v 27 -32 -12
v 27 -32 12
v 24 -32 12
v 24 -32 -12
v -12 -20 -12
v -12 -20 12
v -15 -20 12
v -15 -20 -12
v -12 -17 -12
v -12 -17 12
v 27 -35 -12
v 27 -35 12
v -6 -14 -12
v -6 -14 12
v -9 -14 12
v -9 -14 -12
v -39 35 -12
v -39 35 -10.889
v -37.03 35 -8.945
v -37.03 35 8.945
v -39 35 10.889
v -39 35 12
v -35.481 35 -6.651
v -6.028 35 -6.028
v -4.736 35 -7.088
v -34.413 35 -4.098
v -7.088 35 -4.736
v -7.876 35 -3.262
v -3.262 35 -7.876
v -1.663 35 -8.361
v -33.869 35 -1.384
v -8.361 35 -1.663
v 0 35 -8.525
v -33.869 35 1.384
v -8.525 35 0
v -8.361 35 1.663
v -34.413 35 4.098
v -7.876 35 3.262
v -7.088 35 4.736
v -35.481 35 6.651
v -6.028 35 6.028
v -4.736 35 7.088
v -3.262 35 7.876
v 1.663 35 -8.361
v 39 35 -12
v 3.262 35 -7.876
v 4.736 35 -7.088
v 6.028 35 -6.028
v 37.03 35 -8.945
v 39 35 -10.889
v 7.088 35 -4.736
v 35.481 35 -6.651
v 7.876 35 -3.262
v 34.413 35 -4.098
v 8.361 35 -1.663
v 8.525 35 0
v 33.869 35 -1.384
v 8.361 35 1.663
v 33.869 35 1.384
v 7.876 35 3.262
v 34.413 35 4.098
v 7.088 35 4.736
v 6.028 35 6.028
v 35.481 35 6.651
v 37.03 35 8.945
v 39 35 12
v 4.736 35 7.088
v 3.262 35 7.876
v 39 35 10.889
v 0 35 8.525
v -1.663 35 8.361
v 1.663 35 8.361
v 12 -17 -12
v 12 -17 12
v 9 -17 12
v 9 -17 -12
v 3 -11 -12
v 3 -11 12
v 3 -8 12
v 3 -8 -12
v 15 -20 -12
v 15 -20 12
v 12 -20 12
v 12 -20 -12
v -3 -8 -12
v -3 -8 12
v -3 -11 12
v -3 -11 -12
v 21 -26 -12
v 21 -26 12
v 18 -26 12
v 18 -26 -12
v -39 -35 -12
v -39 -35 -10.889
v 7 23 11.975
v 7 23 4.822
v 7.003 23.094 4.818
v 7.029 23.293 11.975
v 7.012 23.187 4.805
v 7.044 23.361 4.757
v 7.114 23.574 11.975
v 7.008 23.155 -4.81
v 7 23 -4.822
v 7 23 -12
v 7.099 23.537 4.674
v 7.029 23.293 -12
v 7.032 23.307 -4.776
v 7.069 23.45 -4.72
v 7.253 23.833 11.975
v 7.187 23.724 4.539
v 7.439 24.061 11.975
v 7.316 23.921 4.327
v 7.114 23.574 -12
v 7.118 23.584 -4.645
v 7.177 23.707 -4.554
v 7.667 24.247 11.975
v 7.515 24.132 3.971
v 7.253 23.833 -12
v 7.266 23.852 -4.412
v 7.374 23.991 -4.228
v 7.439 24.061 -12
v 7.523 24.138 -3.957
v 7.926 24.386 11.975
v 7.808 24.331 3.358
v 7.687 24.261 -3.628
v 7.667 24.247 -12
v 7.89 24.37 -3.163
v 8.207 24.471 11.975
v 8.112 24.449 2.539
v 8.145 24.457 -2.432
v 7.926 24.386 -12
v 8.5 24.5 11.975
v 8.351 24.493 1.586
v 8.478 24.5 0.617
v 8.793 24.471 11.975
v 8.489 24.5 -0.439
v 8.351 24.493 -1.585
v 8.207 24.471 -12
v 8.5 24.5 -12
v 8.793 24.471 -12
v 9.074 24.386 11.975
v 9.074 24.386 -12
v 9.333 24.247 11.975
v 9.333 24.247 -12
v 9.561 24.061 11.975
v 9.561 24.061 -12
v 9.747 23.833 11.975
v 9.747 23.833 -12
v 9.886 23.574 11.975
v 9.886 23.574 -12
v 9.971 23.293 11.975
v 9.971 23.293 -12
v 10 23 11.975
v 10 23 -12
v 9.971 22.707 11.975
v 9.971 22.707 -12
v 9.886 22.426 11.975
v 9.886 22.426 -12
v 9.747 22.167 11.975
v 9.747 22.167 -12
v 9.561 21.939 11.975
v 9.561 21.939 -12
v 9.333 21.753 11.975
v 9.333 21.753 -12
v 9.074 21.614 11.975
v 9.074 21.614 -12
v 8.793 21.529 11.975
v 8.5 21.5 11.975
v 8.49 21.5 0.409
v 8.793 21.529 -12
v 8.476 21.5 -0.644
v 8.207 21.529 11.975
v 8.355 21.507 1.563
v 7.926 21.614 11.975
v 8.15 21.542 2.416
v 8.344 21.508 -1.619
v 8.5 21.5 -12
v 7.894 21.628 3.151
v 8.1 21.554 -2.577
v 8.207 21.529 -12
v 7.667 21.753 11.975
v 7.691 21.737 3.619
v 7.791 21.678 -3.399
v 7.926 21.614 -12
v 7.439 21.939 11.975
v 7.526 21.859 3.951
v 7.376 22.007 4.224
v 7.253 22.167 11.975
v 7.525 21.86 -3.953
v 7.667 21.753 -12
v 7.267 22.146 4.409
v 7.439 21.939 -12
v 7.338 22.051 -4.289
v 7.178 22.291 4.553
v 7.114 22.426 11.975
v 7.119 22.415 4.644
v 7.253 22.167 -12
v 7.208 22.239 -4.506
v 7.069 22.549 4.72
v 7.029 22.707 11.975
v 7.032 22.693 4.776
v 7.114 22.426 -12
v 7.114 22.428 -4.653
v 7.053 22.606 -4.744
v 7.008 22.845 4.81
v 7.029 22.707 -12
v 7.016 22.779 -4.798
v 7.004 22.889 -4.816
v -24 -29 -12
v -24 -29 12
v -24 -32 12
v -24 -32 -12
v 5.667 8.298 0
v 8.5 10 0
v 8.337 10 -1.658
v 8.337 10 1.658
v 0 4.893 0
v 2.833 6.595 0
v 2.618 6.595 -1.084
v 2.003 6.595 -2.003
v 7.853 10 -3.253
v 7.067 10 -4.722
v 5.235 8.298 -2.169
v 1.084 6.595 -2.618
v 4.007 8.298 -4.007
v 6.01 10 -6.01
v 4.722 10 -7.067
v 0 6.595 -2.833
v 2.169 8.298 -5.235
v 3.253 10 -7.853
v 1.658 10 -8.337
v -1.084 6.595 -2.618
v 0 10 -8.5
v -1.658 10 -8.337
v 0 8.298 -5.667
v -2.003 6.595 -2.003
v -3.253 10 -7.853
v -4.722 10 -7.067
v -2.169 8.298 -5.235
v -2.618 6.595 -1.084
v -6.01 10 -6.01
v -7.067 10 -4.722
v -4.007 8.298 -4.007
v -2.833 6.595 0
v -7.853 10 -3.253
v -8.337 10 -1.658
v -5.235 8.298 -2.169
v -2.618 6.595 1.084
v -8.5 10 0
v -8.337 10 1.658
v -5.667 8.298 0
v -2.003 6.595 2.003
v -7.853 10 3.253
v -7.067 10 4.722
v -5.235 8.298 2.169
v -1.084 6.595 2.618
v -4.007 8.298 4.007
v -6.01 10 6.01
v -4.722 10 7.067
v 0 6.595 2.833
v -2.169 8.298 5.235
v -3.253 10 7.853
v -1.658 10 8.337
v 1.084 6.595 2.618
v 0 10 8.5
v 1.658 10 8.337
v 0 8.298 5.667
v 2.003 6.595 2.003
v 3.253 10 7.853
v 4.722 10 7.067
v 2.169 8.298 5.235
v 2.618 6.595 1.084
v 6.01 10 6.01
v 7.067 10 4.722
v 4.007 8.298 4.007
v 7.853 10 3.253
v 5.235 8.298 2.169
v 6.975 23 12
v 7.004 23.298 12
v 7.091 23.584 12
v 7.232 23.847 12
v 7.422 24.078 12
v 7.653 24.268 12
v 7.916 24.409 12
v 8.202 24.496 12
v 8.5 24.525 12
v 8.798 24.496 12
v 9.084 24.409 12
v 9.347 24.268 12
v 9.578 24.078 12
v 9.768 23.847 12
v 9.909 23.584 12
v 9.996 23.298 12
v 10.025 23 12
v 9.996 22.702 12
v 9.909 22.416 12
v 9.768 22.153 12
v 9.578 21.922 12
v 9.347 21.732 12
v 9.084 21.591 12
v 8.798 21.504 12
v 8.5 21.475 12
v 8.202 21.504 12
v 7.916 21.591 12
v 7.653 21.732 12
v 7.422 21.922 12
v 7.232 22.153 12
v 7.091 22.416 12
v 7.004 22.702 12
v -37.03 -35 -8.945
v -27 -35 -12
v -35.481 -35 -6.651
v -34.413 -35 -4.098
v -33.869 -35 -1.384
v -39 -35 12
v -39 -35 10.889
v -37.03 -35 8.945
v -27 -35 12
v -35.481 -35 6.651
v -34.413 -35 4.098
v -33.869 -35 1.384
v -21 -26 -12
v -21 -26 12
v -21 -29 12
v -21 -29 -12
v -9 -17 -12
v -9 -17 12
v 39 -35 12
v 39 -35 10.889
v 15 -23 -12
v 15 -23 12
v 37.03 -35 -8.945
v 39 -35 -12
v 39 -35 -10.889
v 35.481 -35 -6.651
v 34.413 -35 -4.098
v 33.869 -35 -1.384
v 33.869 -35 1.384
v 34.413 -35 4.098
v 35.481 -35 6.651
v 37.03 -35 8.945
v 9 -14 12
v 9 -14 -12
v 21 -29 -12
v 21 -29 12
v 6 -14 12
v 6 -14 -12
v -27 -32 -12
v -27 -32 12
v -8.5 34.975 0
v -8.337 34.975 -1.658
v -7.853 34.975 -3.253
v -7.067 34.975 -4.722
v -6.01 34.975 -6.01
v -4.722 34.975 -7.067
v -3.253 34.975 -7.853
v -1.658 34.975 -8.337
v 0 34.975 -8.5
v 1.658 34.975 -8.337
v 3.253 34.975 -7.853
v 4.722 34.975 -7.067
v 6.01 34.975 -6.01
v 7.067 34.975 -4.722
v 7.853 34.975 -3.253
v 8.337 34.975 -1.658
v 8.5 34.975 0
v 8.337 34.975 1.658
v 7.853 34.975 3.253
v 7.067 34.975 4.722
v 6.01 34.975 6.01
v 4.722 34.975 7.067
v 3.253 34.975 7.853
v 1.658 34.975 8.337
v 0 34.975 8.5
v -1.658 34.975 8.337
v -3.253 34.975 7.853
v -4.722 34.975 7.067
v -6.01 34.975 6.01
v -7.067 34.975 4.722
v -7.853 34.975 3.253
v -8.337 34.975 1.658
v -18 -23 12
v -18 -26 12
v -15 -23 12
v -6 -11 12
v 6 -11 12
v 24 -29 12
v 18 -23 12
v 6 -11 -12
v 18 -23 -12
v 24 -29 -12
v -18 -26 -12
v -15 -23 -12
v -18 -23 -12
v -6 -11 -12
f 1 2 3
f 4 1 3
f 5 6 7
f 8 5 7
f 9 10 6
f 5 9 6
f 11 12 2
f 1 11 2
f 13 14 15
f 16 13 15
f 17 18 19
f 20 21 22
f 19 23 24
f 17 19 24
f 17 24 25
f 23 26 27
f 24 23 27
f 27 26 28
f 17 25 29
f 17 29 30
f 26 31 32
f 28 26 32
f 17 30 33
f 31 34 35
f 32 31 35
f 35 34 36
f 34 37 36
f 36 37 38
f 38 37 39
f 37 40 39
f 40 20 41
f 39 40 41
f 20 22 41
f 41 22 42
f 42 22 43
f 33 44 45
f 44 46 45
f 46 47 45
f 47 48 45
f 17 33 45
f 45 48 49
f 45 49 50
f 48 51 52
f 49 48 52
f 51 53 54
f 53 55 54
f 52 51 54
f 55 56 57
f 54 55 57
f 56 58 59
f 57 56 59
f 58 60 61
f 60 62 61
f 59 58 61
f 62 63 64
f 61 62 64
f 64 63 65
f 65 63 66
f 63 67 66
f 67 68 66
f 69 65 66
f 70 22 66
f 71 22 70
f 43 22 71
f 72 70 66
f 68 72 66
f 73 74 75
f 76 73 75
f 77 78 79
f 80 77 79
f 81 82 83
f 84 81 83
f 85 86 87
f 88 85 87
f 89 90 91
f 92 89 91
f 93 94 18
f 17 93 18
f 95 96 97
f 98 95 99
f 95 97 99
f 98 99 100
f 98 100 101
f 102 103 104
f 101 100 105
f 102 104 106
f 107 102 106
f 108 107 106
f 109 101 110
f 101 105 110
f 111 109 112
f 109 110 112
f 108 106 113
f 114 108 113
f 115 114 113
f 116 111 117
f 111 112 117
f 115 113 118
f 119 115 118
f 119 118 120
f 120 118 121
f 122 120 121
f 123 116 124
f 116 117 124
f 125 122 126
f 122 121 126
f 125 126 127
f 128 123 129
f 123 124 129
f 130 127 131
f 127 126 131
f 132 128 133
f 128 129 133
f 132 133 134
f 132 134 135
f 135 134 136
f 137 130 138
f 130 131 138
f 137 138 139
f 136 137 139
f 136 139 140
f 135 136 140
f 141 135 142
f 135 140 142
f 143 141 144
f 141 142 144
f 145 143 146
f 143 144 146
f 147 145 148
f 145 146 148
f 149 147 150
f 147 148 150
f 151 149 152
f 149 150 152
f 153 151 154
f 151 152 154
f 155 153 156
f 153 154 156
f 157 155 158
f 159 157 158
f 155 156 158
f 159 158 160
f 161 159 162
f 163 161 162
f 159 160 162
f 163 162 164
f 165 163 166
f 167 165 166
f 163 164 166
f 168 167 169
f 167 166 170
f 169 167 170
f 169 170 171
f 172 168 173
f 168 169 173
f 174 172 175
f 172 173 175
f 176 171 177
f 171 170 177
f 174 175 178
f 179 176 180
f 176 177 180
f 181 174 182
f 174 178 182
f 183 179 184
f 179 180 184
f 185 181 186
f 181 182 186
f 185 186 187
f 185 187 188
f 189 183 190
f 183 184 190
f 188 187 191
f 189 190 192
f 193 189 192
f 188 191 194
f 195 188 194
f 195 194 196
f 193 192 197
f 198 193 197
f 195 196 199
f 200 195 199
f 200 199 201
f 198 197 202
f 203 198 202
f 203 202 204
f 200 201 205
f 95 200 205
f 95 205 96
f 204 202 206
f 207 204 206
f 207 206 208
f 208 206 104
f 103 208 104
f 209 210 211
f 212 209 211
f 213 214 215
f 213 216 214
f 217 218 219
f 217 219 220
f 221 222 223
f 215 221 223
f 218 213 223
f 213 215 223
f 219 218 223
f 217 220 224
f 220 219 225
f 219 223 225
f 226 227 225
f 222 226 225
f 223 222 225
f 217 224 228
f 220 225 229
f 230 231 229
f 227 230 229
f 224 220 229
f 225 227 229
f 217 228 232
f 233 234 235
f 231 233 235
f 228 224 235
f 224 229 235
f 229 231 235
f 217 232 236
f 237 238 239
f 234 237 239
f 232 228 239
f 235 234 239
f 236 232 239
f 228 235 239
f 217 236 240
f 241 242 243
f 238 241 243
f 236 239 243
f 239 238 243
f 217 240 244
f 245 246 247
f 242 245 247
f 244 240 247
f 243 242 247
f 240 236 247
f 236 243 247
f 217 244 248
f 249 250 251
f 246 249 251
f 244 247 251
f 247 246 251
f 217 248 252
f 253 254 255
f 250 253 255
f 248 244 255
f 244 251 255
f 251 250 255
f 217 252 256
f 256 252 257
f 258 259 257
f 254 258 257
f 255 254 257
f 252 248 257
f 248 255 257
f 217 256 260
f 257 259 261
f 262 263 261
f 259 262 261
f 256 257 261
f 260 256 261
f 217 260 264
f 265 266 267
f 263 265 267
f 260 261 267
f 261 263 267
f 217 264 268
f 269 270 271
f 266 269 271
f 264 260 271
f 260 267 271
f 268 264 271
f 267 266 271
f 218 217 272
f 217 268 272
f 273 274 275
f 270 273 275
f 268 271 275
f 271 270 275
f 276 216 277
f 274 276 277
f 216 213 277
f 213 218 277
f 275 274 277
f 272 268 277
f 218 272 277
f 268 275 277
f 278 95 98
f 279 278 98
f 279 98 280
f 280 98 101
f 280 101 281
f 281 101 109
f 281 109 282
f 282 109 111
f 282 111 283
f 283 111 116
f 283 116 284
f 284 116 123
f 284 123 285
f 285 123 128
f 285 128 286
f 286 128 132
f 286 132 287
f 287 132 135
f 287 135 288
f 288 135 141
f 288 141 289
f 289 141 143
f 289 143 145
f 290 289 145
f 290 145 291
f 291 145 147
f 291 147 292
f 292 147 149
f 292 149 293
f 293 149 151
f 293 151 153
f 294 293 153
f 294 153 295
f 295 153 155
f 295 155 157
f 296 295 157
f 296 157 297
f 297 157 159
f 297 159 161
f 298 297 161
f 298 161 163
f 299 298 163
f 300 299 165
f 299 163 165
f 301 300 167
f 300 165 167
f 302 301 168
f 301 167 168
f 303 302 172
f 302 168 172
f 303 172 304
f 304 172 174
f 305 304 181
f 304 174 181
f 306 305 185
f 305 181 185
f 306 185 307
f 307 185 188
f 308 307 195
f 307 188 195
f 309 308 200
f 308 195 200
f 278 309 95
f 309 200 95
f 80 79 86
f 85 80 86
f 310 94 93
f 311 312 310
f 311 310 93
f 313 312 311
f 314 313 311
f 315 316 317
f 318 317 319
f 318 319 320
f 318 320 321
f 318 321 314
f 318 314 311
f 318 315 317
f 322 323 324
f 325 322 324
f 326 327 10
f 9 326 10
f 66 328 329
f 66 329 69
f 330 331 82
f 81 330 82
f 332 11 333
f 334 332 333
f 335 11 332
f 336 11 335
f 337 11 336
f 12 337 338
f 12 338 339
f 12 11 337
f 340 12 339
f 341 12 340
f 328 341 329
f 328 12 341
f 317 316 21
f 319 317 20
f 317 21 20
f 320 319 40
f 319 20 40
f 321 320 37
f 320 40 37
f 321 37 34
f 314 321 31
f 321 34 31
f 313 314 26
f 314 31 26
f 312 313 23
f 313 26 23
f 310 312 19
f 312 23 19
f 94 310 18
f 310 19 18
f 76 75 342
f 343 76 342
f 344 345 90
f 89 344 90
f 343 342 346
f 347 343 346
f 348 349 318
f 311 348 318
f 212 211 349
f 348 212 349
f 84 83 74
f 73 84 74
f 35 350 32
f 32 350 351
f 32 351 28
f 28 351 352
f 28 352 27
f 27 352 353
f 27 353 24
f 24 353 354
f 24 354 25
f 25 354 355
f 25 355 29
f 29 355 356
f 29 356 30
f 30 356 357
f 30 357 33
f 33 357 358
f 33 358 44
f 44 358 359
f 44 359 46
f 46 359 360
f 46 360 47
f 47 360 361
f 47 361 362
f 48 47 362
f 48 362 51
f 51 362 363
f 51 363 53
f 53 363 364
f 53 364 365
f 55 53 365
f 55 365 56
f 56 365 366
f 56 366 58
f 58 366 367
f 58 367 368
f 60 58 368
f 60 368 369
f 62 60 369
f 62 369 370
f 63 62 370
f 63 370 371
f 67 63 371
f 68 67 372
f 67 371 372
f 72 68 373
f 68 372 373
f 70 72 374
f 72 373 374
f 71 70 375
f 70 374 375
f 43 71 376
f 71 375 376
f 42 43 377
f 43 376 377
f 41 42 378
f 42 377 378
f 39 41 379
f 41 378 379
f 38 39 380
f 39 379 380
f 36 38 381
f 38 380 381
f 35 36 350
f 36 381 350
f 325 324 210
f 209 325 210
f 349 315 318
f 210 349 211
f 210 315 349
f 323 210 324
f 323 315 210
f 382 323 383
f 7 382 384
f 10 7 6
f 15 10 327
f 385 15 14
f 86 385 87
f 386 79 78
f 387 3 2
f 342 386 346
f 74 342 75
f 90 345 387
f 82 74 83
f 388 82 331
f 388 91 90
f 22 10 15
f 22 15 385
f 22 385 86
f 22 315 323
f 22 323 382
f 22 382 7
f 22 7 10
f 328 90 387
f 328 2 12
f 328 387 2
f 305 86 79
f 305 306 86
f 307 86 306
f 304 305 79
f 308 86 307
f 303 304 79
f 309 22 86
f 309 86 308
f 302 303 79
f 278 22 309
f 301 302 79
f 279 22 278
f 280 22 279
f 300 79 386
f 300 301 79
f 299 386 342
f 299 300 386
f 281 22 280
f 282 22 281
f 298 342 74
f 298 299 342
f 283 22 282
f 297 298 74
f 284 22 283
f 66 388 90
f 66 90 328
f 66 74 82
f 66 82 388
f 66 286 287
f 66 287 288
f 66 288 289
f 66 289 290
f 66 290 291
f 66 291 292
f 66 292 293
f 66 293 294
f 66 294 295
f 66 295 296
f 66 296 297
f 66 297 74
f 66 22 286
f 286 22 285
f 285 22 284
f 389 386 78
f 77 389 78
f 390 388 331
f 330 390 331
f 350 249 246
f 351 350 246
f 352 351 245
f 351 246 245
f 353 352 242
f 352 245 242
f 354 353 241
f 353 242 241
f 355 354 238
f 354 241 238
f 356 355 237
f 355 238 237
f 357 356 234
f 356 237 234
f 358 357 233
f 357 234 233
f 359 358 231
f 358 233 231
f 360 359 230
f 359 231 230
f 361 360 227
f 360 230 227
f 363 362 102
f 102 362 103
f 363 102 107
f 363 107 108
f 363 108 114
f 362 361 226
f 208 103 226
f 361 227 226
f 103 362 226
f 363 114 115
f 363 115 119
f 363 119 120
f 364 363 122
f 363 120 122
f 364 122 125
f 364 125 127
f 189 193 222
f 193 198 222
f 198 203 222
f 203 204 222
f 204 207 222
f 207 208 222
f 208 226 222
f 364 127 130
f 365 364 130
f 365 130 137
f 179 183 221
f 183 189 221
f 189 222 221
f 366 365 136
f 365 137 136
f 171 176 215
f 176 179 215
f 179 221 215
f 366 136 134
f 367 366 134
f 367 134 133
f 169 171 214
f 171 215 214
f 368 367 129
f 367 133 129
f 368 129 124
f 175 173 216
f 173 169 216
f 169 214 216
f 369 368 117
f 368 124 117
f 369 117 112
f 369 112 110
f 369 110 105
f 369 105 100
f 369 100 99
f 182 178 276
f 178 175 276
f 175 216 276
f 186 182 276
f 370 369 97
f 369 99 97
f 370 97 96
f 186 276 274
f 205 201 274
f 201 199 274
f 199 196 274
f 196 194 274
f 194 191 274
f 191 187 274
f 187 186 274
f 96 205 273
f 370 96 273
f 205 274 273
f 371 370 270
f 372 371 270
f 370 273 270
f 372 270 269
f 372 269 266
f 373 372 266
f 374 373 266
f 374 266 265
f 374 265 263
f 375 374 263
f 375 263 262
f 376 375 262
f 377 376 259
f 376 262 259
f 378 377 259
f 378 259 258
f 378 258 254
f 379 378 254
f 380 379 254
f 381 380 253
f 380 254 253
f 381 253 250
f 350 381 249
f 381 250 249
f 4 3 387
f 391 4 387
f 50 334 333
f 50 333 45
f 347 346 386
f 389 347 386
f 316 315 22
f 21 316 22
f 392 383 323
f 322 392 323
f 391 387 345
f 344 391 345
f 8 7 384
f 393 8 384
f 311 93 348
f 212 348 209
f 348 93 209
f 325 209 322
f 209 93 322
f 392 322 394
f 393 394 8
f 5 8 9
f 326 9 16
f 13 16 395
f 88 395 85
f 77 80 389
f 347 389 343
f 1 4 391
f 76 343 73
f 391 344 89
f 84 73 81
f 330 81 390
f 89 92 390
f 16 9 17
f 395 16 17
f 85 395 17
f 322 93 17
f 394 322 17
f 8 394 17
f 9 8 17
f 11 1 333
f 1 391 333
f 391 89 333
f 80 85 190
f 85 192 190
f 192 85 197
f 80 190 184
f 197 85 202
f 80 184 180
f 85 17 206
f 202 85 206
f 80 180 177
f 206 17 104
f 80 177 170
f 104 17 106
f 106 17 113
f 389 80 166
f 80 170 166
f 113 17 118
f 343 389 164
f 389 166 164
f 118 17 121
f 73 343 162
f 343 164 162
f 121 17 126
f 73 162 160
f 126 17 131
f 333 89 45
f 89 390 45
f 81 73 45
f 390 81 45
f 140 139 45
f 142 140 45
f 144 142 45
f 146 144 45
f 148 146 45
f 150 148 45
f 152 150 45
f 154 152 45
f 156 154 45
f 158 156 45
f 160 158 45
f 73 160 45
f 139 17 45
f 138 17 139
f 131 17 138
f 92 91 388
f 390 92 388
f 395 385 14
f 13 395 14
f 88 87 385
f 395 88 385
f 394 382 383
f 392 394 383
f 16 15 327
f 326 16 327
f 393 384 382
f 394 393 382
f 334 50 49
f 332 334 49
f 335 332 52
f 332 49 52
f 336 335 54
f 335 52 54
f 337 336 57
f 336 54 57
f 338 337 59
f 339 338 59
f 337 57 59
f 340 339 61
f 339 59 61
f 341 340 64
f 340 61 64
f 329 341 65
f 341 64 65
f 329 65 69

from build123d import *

# Parameters (mm, degrees)
SKETCH1_W                            = 78
SKETCH1_H                            = 70
BOSS_EXTRUDE1_DEPTH                  = 12
F_17_0_17_DIAMETER_HOLE1_D           = 17
F_17_0_17_DIAMETER_HOLE1_DEPTH       = 25
F_17_0_17_DIAMETER_HOLE1_CSINK_D     = 17.05
F_17_0_17_DIAMETER_HOLE1_CSINK_ANGLE = 90
F_17_0_17_DIAMETER_HOLE1_TIP         = 5.107315262
F_3_0_3_DIAMETER_HOLE2_D             = 3
F_3_0_3_DIAMETER_HOLE2_CSINK_D       = 3.05
F_3_0_3_DIAMETER_HOLE2_CSINK_ANGLE   = 90
CUT_EXTRUDE1_REACH                   = 83.025
SKETCH11_R                           = 14
CUT_EXTRUDE2_REACH                   = 59.637


with BuildPart() as part:
    # Sketch1 → Boss-Extrude1 (new, symmetric)
    with BuildSketch(Plane.XY):
        Rectangle(SKETCH1_W, SKETCH1_H)
    extrude(amount=BOSS_EXTRUDE1_DEPTH, both=True)

    # Ø17.0 (17) Diameter Hole1
    with Locations(Plane(origin=(0, 35, 0), x_dir=(1, 0, 0), z_dir=(0, 1, 0))):
        with Locations((0, 0)):
            CounterSinkHole(F_17_0_17_DIAMETER_HOLE1_D / 2, F_17_0_17_DIAMETER_HOLE1_CSINK_D / 2, depth=F_17_0_17_DIAMETER_HOLE1_DEPTH, counter_sink_angle=F_17_0_17_DIAMETER_HOLE1_CSINK_ANGLE)
            with Locations((0, 0, -(F_17_0_17_DIAMETER_HOLE1_DEPTH + F_17_0_17_DIAMETER_HOLE1_TIP / 2))):  # 118° drill point
                Cone(0, F_17_0_17_DIAMETER_HOLE1_D / 2, F_17_0_17_DIAMETER_HOLE1_TIP, mode=Mode.SUBTRACT)

    # Ø3.0 (3) Diameter Hole2 (through all)
    with Locations(Plane.XY.offset(12)):
        with Locations((8.5, 23)):
            CounterSinkHole(F_3_0_3_DIAMETER_HOLE2_D / 2, F_3_0_3_DIAMETER_HOLE2_CSINK_D / 2, counter_sink_angle=F_3_0_3_DIAMETER_HOLE2_CSINK_ANGLE)

    # Sketch11 → Cut-Extrude1 (cut, up to next)
    with BuildSketch(Plane(origin=(0, 35, 0), x_dir=(1, 0, 0), z_dir=(0, 1, 0)), mode=Mode.PRIVATE) as cut_extrude1_sk1:
        with Locations((-47.8, 0)):
            Circle(SKETCH11_R)
    cut_extrude1_tool1 = extrude(cut_extrude1_sk1.sketch, amount=-CUT_EXTRUDE1_REACH, mode=Mode.PRIVATE) & part.part
    # Sketch11 → Cut-Extrude1 (cut, up to next)
    with BuildSketch(Plane(origin=(0, 35, 0), x_dir=(1, 0, 0), z_dir=(0, 1, 0)), mode=Mode.PRIVATE) as cut_extrude1_sk2:
        with Locations((47.8, 0)):
            Circle(SKETCH11_R)
    cut_extrude1_tool2 = extrude(cut_extrude1_sk2.sketch, amount=-CUT_EXTRUDE1_REACH, mode=Mode.PRIVATE) & part.part
    add(cut_extrude1_tool1.solids().sort_by_distance((-47.8, 35, 0))[0], mode=Mode.SUBTRACT)
    add(cut_extrude1_tool2.solids().sort_by_distance((47.8, 35, 0))[0], mode=Mode.SUBTRACT)

    # Sketch12 → Cut-Extrude2 (cut, up to next)
    with BuildSketch(Plane.XY.offset(12), mode=Mode.PRIVATE) as cut_extrude2_sk1:
        Polygon((27, -35), (27, -32), (24, -32), (24, -29), (21, -29), (21, -26), (18, -26), (18, -23), (15, -23), (15, -20), (12, -20), (12, -17), (9, -17), (9, -14), (6, -14), (6, -11), (3, -11), (3, -8), (-3, -8), (-3, -11), (-6, -11), (-6, -14), (-9, -14), (-9, -17), (-12, -17), (-12, -20), (-15, -20), (-15, -23), (-18, -23), (-18, -26), (-21, -26), (-21, -29), (-24, -29), (-24, -32), (-27, -32), (-27, -35), align=None)
    cut_extrude2_tool1 = extrude(cut_extrude2_sk1.sketch, amount=-CUT_EXTRUDE2_REACH, mode=Mode.PRIVATE) & part.part
    add(cut_extrude2_tool1.solids().sort_by_distance((0, -25.5, 12))[0], mode=Mode.SUBTRACT)


solid = part.part
